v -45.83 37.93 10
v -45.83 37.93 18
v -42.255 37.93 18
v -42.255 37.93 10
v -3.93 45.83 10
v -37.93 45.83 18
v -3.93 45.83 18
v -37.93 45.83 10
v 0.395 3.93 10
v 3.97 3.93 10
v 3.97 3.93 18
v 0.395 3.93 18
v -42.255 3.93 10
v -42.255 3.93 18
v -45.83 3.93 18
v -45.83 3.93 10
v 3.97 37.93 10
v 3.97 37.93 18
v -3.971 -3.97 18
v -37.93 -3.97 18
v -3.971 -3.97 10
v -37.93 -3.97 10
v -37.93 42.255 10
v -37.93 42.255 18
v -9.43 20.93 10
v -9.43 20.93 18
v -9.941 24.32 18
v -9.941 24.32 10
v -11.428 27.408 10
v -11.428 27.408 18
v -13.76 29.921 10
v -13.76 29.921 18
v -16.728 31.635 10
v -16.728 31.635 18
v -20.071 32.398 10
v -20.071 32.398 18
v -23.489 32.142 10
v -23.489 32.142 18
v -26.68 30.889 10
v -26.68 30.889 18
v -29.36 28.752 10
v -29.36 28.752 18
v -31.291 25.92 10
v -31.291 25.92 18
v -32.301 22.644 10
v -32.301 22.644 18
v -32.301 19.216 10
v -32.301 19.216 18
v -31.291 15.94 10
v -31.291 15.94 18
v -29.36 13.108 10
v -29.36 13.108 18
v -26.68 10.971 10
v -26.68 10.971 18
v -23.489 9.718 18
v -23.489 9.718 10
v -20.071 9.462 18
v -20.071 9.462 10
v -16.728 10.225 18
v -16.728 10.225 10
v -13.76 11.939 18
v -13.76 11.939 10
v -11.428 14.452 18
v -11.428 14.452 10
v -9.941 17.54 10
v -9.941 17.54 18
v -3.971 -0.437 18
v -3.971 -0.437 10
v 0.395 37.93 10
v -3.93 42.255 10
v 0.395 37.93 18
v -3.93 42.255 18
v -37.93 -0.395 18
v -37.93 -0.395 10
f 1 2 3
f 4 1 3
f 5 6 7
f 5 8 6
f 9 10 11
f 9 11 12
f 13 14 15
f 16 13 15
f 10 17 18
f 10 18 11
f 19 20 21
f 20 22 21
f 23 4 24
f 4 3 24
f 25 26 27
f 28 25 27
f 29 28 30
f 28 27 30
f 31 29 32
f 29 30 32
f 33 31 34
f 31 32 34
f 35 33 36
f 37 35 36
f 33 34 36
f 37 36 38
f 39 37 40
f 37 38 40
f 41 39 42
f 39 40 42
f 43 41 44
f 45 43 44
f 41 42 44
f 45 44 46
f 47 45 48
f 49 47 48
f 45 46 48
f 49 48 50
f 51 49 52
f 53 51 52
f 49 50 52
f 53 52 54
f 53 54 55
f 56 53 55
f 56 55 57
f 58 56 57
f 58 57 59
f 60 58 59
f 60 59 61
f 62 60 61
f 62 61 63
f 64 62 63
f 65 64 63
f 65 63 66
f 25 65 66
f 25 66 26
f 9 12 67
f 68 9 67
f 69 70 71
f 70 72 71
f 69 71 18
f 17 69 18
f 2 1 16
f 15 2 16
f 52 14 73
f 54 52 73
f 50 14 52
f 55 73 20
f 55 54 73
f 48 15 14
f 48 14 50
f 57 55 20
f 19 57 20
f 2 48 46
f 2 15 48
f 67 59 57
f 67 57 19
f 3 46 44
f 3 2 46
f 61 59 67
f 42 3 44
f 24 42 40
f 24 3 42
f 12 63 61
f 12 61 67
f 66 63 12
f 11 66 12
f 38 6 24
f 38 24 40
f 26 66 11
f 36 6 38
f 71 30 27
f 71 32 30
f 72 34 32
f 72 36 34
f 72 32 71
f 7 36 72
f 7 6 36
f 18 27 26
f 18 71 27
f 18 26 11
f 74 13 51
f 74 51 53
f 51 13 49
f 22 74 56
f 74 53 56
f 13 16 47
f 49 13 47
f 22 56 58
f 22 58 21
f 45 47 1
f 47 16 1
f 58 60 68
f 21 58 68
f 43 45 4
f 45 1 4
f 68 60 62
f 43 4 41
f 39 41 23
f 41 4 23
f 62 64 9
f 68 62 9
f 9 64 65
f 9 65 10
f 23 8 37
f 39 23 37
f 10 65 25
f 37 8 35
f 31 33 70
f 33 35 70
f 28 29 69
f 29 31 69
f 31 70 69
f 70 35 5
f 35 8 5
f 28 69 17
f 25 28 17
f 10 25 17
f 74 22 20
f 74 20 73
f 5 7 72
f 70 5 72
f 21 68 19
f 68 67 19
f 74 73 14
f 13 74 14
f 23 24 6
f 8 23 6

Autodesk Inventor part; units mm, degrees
ref_plane "YZ Plane" through (0, 0, 0) normal (1, 0, 0) x (0, 1, 0)
ref_plane "XZ Plane" through (0, 0, 0) normal (0, 1, 0) x (-1, 0, 0)
ref_plane "Work Plane1" through (0, 0, 10) normal (0, 0, 1) x (1, 0, 0)
sketch "Sketch1" plane through (0, 0, 10) normal (0, 0, 1) x (1, 0, 0)
  line L0 (-4.0299, -0.3538) -> (-2.2322, 1.4439) construction
  arc A0 (-1.4439, 2.2322) -> (-2.2322, 1.4439) centre (-0.9299, 0.9299) ccw construction
  line L1 (-1.4439, 2.2322) -> (0.3538, 4.0299) construction
  line L2 (-37.8299, 42.8299) -> (-37.8299, 37.8299) construction
  line L3 (-37.8299, 37.8299) -> (-42.9208, 37.8299) construction
  line L4 (-37.8299, 42.2137) -> (-37.8299, 45.8299) construction
  line L5 (-37.8299, 45.8299) -> (-4.0299, 45.8299) construction
  line L6 (-4.0299, 45.8299) -> (-4.0299, 42.2137) construction
  line L7 (-4.0299, 4.0299) -> (0.3538, 4.0299) projected
  circle A1 centre (-20.9299, 20.9299) radius 17.5 projected
  line L8 (-20.9299, 58.9723) -> (17.1124, 20.9299) construction
  line L9 (17.1124, 20.9299) -> (-20.9299, -17.1124) construction
  line L10 (-20.9299, -17.1124) -> (-58.9723, 20.9299) construction
  line L11 (-58.9723, 20.9299) -> (-20.9299, 58.9723) construction
  line L12 (-20.9299, 58.9723) -> (-20.9299, -17.1124) construction
  line L13 (17.1124, 20.9299) -> (-58.9723, 20.9299) construction
  line L14 (-20.9299, 58.9723) -> (32.8701, 58.9723) construction
  line L15 (-43.4299, 43.4299) -> (1.5701, 43.4299) construction
  line L16 (1.5701, 43.4299) -> (1.5701, -1.5701) construction
  line L17 (1.5701, -1.5701) -> (-43.4299, -1.5701) construction
  line L18 (-43.4299, -1.5701) -> (-43.4299, 43.4299) construction
  line L19 (-43.4299, 43.4299) -> (1.5701, -1.5701) construction
  line L20 (1.5701, 43.4299) -> (-43.4299, -1.5701) construction
  line L21 (-43.4299, 5.3876) -> (-43.4299, 36.4723)
  line L22 (-43.4299, 36.4723) -> (-36.4723, 43.4299)
  line L23 (-36.4723, 43.4299) -> (-5.3876, 43.4299)
  line L24 (-5.3876, 43.4299) -> (1.5701, 36.4723)
  line L25 (1.5701, 36.4723) -> (1.5701, 5.3876)
  line L26 (1.5701, 5.3876) -> (-5.3876, -1.5701)
  line L27 (-5.3876, -1.5701) -> (-36.4723, -1.5701)
  line L28 (-36.4723, -1.5701) -> (-43.4299, 5.3876)
  line L29 (-4.0299, 42.2137) -> (-37.8299, 42.2137) projected
  line L30 (-4.0299, -0.3538) -> (-4.0299, 4.0299) projected
  circle A2 centre (-20.9299, 20.9299) radius 1.5
  line L31 (-10.9299, 10.9299) -> (-30.9299, 10.9299) construction
  line L32 (-30.9299, 10.9299) -> (-30.9299, 30.9299) construction
  line L33 (-30.9299, 30.9299) -> (-10.9299, 30.9299) construction
  line L34 (-10.9299, 30.9299) -> (-10.9299, 10.9299) construction
  line L35 (-10.9299, 10.9299) -> (-30.9299, 30.9299) construction
  line L36 (-30.9299, 10.9299) -> (-10.9299, 30.9299) construction
  circle A3 centre (-30.9299, 30.9299) radius 1.4
  circle A4 centre (-30.9299, 10.9299) radius 1.4
  circle A5 centre (-10.9299, 10.9299) radius 1.4
  line L37 (-45.8299, 37.8299) -> (-42.0723, 37.8299) construction
  line L38 (-42.1723, 37.7299) -> (-45.8299, 37.7299)
  line L39 (-45.8299, 37.7299) -> (-45.8299, 4.1299)
  line L40 (-45.8299, 4.1299) -> (-42.1723, 4.1299)
  line L41 (-42.1723, 4.1299) -> (-42.1723, 37.7299)
  line L42 (-45.8299, 4.0299) -> (-42.0723, 4.0299) construction
  line L43 (-45.8299, 37.8299) -> (-42.0723, 37.8299) projected
  line L44 (-37.7299, 45.8299) -> (-4.1299, 45.8299)
  line L45 (-4.1299, 45.8299) -> (-4.1299, 42.1723)
  line L46 (-4.1299, 42.1723) -> (-37.7299, 42.1723)
  line L47 (-37.7299, 42.1723) -> (-37.7299, 45.8299)
  line L48 (0.4701, 37.8299) -> (0.4701, 4.0299) construction
  line L49 (0.4701, 4.0299) -> (3.9701, 4.0299) construction
  line L50 (3.9701, 37.8299) -> (3.9701, 4.0299) construction
  line L51 (0.4701, 37.8299) -> (3.9701, 37.8299) construction
  line L52 (-45.8299, -3.9701) -> (-4.0299, -3.9701) construction
  line L53 (0.3124, 37.7299) -> (3.9701, 37.7299)
  line L54 (3.9701, 37.7299) -> (3.9701, 4.1299)
  line L55 (3.9701, 4.1299) -> (0.3124, 4.1299)
  line L56 (0.3124, 4.1299) -> (0.3124, 37.7299)
  line L57 (-4.1713, -0.3538) -> (-37.7299, -0.3538)
  line L58 (-37.7299, -0.3538) -> (-37.7299, -3.9701)
  line L59 (-37.7299, -3.9701) -> (-4.1713, -3.9701)
  line L60 (-4.1713, -3.9701) -> (-4.1713, -0.3538)
  point P0 (-37.8299, 4.0299)
  dimension "d18" = 53.8
  dimension "d19" = 45
  dimension "d20" = 53.8
  dimension "d21" = 45
  dimension "d22" = 45
  dimension "d30" = 20
  dimension "d31" = 20
  dimension "d32" = 2.8
  dimension "d33" = 2.8
  dimension "d34" = 2.8
  dimension "d35" = 3
  dimension "d36" = 0.1
  dimension "d37" = 0.1
  dimension "d38" = 0.1
  dimension "d39" = 0.1
extrude "Extrusion1" add sketch "Sketch1" along normal blind 8 contours L30 L26 L57 L28 L41 L22 L46 L24 L56 L7 | L7 L26 L30 | L56 L24 L25 L26 | L26 L25 L24 L53 L54 L55 | L60 L59 L58 L57 L28 L27 L26 | L26 L27 L28 L57 | L46 L22 L29 L24 | L24 L29 L45 | L40 L39 L38 L22 L21 L28 | L28 L21 L22 L41 | L29 L22 L23 L24 | L24 L23 L22 L29 L47 L44 L45 | L47 L29 L22 | A1 | A2 | A3 | A4 | A5
sketch "Skizze4" plane through (0, 0, 18) normal (0, 0, 1) x (1, 0, 0)
  line L0 (-37.7299, 42.1723) -> (-42.1723, 37.7299) projected
  line L1 (-42.1723, 37.7299) -> (-45.8299, 37.7299) projected
  line L2 (-45.8299, 37.7299) -> (-45.8299, 4.1299) construction
  line L3 (-45.8299, 4.1299) -> (-42.1723, 4.1299) projected
  line L4 (-42.1723, 4.1299) -> (-37.6885, -0.3538) projected
  line L5 (-37.6885, -0.3538) -> (-37.7299, -0.3538) projected
  line L6 (-37.7299, -0.3538) -> (-37.7299, -3.9701) projected
  line L7 (-37.7299, -3.9701) -> (-4.1713, -3.9701) construction
  line L8 (-4.1713, -3.9701) -> (-4.1713, -0.3538) projected
  line L9 (-4.1713, -0.3538) -> (0.3124, 4.1299) projected
  line L10 (0.3124, 4.1299) -> (3.9701, 4.1299) projected
  line L11 (3.9701, 4.1299) -> (3.9701, 37.7299) construction
  line L12 (3.9701, 37.7299) -> (0.3124, 37.7299) projected
  line L13 (0.3124, 37.7299) -> (-4.1299, 42.1723) projected
  line L14 (-4.1299, 42.1723) -> (-4.1299, 45.8299) projected
  line L15 (-4.1299, 45.8299) -> (-37.7299, 45.8299) construction
  line L16 (-37.7299, 45.8299) -> (-37.7299, 42.1723) projected
  line L17 (-37.9299, 46.0299) -> (-3.9299, 46.0299) construction
  line L18 (-3.9299, 46.0299) -> (-3.9299, 42.2551)
  line L19 (-3.9299, 42.2551) -> (0.3953, 37.9299)
  line L20 (0.3953, 37.9299) -> (4.1701, 37.9299)
  line L21 (4.1701, 37.9299) -> (4.1701, 3.9299) construction
  line L22 (4.1701, 3.9299) -> (0.3953, 3.9299)
  line L23 (0.3953, 3.9299) -> (-3.9713, -0.4367)
  line L24 (-3.9713, -0.4367) -> (-3.9713, -4.1701)
  line L25 (-3.9713, -4.1701) -> (-37.9299, -4.1701) construction
  line L26 (-37.9299, -4.1701) -> (-37.9299, -0.3953)
  line L27 (-37.9299, -0.3953) -> (-42.2551, 3.9299)
  line L28 (-42.2551, 3.9299) -> (-46.0299, 3.9299)
  line L29 (-46.0299, 3.9299) -> (-46.0299, 37.9299) construction
  line L30 (-46.0299, 37.9299) -> (-42.2551, 37.9299)
  line L31 (-42.2551, 37.9299) -> (-37.9299, 42.2551)
  line L32 (-37.9299, 42.2551) -> (-37.9299, 46.0299)
  line L33 (-45.8299, 37.7299) -> (-45.8299, 37.9299)
  line L34 (-4.1299, 45.8299) -> (-37.7299, 45.8299) projected
  line L35 (-37.7299, 45.8299) -> (-37.9299, 45.8299)
  line L36 (-4.1299, 45.8299) -> (-3.9299, 45.8299)
  line L37 (3.9701, 37.7299) -> (3.9701, 37.9299)
  line L38 (3.9701, 4.1299) -> (3.9701, 37.7299) projected
  line L39 (3.9701, 4.1299) -> (3.9701, 3.9299)
  line L40 (-4.1713, -3.9701) -> (-3.9713, -3.9701)
  line L41 (-37.7299, -3.9701) -> (-37.9299, -3.9701)
  line L42 (-45.8299, 4.1299) -> (-45.8299, 3.9299)
  point P0 (0, 0)
  dimension "d40" = 0.2
extrude "IM_offset" add sketch "Skizze4" against normal up to surface (8 mm away)
sketch "Sketch20" plane through (0, 0, 18) normal (0, 0, 1) x (1, 0, 0)
  line L0 (-3.9299, 45.8299) -> (-37.9299, 45.8299) projected
  line L1 (-37.9299, 45.8299) -> (-37.9299, 42.2551) projected
  line L2 (-37.9299, 42.2551) -> (-42.2551, 37.9299) projected
  line L3 (-42.2551, 37.9299) -> (-45.8299, 37.9299) projected
  line L4 (-45.8299, 37.9299) -> (-45.8299, 3.9299) projected
  line L5 (-42.2551, 3.9299) -> (-45.8299, 3.9299) projected
  line L6 (-37.9299, -0.3953) -> (-42.2551, 3.9299) projected
  line L7 (-37.9299, -3.9701) -> (-37.9299, -0.3953) projected
  line L8 (-3.9713, -3.9701) -> (-37.9299, -3.9701) projected
  line L9 (-3.9713, -3.9701) -> (-3.9713, -0.4367) projected
  line L10 (-3.9713, -0.4367) -> (0.3953, 3.9299) projected
  line L11 (0.3953, 3.9299) -> (3.9701, 3.9299) projected
  line L12 (3.9701, 3.9299) -> (3.9701, 37.9299) projected
  line L13 (3.9701, 37.9299) -> (0.3953, 37.9299) projected
  line L14 (0.3953, 37.9299) -> (-3.9299, 42.2551) projected
  line L15 (-3.9299, 42.2551) -> (-3.9299, 45.8299) projected
  circle A0 centre (-20.9299, 20.9299) radius 11.5
  line L16 (-12.9299, 28.9299) -> (-28.9299, 12.9299) construction
  line L17 (-28.9299, 28.9299) -> (-12.9299, 12.9299) construction
  point P0 (0, 0)
  dimension "d113" = 23
  dimension "d115" = 16
  dimension "d116" = 16
extrude "Extrusion18" cut sketch "Sketch20" against normal through all contours A0
properties part number "20_Cube_Insert_Eyepiece"
